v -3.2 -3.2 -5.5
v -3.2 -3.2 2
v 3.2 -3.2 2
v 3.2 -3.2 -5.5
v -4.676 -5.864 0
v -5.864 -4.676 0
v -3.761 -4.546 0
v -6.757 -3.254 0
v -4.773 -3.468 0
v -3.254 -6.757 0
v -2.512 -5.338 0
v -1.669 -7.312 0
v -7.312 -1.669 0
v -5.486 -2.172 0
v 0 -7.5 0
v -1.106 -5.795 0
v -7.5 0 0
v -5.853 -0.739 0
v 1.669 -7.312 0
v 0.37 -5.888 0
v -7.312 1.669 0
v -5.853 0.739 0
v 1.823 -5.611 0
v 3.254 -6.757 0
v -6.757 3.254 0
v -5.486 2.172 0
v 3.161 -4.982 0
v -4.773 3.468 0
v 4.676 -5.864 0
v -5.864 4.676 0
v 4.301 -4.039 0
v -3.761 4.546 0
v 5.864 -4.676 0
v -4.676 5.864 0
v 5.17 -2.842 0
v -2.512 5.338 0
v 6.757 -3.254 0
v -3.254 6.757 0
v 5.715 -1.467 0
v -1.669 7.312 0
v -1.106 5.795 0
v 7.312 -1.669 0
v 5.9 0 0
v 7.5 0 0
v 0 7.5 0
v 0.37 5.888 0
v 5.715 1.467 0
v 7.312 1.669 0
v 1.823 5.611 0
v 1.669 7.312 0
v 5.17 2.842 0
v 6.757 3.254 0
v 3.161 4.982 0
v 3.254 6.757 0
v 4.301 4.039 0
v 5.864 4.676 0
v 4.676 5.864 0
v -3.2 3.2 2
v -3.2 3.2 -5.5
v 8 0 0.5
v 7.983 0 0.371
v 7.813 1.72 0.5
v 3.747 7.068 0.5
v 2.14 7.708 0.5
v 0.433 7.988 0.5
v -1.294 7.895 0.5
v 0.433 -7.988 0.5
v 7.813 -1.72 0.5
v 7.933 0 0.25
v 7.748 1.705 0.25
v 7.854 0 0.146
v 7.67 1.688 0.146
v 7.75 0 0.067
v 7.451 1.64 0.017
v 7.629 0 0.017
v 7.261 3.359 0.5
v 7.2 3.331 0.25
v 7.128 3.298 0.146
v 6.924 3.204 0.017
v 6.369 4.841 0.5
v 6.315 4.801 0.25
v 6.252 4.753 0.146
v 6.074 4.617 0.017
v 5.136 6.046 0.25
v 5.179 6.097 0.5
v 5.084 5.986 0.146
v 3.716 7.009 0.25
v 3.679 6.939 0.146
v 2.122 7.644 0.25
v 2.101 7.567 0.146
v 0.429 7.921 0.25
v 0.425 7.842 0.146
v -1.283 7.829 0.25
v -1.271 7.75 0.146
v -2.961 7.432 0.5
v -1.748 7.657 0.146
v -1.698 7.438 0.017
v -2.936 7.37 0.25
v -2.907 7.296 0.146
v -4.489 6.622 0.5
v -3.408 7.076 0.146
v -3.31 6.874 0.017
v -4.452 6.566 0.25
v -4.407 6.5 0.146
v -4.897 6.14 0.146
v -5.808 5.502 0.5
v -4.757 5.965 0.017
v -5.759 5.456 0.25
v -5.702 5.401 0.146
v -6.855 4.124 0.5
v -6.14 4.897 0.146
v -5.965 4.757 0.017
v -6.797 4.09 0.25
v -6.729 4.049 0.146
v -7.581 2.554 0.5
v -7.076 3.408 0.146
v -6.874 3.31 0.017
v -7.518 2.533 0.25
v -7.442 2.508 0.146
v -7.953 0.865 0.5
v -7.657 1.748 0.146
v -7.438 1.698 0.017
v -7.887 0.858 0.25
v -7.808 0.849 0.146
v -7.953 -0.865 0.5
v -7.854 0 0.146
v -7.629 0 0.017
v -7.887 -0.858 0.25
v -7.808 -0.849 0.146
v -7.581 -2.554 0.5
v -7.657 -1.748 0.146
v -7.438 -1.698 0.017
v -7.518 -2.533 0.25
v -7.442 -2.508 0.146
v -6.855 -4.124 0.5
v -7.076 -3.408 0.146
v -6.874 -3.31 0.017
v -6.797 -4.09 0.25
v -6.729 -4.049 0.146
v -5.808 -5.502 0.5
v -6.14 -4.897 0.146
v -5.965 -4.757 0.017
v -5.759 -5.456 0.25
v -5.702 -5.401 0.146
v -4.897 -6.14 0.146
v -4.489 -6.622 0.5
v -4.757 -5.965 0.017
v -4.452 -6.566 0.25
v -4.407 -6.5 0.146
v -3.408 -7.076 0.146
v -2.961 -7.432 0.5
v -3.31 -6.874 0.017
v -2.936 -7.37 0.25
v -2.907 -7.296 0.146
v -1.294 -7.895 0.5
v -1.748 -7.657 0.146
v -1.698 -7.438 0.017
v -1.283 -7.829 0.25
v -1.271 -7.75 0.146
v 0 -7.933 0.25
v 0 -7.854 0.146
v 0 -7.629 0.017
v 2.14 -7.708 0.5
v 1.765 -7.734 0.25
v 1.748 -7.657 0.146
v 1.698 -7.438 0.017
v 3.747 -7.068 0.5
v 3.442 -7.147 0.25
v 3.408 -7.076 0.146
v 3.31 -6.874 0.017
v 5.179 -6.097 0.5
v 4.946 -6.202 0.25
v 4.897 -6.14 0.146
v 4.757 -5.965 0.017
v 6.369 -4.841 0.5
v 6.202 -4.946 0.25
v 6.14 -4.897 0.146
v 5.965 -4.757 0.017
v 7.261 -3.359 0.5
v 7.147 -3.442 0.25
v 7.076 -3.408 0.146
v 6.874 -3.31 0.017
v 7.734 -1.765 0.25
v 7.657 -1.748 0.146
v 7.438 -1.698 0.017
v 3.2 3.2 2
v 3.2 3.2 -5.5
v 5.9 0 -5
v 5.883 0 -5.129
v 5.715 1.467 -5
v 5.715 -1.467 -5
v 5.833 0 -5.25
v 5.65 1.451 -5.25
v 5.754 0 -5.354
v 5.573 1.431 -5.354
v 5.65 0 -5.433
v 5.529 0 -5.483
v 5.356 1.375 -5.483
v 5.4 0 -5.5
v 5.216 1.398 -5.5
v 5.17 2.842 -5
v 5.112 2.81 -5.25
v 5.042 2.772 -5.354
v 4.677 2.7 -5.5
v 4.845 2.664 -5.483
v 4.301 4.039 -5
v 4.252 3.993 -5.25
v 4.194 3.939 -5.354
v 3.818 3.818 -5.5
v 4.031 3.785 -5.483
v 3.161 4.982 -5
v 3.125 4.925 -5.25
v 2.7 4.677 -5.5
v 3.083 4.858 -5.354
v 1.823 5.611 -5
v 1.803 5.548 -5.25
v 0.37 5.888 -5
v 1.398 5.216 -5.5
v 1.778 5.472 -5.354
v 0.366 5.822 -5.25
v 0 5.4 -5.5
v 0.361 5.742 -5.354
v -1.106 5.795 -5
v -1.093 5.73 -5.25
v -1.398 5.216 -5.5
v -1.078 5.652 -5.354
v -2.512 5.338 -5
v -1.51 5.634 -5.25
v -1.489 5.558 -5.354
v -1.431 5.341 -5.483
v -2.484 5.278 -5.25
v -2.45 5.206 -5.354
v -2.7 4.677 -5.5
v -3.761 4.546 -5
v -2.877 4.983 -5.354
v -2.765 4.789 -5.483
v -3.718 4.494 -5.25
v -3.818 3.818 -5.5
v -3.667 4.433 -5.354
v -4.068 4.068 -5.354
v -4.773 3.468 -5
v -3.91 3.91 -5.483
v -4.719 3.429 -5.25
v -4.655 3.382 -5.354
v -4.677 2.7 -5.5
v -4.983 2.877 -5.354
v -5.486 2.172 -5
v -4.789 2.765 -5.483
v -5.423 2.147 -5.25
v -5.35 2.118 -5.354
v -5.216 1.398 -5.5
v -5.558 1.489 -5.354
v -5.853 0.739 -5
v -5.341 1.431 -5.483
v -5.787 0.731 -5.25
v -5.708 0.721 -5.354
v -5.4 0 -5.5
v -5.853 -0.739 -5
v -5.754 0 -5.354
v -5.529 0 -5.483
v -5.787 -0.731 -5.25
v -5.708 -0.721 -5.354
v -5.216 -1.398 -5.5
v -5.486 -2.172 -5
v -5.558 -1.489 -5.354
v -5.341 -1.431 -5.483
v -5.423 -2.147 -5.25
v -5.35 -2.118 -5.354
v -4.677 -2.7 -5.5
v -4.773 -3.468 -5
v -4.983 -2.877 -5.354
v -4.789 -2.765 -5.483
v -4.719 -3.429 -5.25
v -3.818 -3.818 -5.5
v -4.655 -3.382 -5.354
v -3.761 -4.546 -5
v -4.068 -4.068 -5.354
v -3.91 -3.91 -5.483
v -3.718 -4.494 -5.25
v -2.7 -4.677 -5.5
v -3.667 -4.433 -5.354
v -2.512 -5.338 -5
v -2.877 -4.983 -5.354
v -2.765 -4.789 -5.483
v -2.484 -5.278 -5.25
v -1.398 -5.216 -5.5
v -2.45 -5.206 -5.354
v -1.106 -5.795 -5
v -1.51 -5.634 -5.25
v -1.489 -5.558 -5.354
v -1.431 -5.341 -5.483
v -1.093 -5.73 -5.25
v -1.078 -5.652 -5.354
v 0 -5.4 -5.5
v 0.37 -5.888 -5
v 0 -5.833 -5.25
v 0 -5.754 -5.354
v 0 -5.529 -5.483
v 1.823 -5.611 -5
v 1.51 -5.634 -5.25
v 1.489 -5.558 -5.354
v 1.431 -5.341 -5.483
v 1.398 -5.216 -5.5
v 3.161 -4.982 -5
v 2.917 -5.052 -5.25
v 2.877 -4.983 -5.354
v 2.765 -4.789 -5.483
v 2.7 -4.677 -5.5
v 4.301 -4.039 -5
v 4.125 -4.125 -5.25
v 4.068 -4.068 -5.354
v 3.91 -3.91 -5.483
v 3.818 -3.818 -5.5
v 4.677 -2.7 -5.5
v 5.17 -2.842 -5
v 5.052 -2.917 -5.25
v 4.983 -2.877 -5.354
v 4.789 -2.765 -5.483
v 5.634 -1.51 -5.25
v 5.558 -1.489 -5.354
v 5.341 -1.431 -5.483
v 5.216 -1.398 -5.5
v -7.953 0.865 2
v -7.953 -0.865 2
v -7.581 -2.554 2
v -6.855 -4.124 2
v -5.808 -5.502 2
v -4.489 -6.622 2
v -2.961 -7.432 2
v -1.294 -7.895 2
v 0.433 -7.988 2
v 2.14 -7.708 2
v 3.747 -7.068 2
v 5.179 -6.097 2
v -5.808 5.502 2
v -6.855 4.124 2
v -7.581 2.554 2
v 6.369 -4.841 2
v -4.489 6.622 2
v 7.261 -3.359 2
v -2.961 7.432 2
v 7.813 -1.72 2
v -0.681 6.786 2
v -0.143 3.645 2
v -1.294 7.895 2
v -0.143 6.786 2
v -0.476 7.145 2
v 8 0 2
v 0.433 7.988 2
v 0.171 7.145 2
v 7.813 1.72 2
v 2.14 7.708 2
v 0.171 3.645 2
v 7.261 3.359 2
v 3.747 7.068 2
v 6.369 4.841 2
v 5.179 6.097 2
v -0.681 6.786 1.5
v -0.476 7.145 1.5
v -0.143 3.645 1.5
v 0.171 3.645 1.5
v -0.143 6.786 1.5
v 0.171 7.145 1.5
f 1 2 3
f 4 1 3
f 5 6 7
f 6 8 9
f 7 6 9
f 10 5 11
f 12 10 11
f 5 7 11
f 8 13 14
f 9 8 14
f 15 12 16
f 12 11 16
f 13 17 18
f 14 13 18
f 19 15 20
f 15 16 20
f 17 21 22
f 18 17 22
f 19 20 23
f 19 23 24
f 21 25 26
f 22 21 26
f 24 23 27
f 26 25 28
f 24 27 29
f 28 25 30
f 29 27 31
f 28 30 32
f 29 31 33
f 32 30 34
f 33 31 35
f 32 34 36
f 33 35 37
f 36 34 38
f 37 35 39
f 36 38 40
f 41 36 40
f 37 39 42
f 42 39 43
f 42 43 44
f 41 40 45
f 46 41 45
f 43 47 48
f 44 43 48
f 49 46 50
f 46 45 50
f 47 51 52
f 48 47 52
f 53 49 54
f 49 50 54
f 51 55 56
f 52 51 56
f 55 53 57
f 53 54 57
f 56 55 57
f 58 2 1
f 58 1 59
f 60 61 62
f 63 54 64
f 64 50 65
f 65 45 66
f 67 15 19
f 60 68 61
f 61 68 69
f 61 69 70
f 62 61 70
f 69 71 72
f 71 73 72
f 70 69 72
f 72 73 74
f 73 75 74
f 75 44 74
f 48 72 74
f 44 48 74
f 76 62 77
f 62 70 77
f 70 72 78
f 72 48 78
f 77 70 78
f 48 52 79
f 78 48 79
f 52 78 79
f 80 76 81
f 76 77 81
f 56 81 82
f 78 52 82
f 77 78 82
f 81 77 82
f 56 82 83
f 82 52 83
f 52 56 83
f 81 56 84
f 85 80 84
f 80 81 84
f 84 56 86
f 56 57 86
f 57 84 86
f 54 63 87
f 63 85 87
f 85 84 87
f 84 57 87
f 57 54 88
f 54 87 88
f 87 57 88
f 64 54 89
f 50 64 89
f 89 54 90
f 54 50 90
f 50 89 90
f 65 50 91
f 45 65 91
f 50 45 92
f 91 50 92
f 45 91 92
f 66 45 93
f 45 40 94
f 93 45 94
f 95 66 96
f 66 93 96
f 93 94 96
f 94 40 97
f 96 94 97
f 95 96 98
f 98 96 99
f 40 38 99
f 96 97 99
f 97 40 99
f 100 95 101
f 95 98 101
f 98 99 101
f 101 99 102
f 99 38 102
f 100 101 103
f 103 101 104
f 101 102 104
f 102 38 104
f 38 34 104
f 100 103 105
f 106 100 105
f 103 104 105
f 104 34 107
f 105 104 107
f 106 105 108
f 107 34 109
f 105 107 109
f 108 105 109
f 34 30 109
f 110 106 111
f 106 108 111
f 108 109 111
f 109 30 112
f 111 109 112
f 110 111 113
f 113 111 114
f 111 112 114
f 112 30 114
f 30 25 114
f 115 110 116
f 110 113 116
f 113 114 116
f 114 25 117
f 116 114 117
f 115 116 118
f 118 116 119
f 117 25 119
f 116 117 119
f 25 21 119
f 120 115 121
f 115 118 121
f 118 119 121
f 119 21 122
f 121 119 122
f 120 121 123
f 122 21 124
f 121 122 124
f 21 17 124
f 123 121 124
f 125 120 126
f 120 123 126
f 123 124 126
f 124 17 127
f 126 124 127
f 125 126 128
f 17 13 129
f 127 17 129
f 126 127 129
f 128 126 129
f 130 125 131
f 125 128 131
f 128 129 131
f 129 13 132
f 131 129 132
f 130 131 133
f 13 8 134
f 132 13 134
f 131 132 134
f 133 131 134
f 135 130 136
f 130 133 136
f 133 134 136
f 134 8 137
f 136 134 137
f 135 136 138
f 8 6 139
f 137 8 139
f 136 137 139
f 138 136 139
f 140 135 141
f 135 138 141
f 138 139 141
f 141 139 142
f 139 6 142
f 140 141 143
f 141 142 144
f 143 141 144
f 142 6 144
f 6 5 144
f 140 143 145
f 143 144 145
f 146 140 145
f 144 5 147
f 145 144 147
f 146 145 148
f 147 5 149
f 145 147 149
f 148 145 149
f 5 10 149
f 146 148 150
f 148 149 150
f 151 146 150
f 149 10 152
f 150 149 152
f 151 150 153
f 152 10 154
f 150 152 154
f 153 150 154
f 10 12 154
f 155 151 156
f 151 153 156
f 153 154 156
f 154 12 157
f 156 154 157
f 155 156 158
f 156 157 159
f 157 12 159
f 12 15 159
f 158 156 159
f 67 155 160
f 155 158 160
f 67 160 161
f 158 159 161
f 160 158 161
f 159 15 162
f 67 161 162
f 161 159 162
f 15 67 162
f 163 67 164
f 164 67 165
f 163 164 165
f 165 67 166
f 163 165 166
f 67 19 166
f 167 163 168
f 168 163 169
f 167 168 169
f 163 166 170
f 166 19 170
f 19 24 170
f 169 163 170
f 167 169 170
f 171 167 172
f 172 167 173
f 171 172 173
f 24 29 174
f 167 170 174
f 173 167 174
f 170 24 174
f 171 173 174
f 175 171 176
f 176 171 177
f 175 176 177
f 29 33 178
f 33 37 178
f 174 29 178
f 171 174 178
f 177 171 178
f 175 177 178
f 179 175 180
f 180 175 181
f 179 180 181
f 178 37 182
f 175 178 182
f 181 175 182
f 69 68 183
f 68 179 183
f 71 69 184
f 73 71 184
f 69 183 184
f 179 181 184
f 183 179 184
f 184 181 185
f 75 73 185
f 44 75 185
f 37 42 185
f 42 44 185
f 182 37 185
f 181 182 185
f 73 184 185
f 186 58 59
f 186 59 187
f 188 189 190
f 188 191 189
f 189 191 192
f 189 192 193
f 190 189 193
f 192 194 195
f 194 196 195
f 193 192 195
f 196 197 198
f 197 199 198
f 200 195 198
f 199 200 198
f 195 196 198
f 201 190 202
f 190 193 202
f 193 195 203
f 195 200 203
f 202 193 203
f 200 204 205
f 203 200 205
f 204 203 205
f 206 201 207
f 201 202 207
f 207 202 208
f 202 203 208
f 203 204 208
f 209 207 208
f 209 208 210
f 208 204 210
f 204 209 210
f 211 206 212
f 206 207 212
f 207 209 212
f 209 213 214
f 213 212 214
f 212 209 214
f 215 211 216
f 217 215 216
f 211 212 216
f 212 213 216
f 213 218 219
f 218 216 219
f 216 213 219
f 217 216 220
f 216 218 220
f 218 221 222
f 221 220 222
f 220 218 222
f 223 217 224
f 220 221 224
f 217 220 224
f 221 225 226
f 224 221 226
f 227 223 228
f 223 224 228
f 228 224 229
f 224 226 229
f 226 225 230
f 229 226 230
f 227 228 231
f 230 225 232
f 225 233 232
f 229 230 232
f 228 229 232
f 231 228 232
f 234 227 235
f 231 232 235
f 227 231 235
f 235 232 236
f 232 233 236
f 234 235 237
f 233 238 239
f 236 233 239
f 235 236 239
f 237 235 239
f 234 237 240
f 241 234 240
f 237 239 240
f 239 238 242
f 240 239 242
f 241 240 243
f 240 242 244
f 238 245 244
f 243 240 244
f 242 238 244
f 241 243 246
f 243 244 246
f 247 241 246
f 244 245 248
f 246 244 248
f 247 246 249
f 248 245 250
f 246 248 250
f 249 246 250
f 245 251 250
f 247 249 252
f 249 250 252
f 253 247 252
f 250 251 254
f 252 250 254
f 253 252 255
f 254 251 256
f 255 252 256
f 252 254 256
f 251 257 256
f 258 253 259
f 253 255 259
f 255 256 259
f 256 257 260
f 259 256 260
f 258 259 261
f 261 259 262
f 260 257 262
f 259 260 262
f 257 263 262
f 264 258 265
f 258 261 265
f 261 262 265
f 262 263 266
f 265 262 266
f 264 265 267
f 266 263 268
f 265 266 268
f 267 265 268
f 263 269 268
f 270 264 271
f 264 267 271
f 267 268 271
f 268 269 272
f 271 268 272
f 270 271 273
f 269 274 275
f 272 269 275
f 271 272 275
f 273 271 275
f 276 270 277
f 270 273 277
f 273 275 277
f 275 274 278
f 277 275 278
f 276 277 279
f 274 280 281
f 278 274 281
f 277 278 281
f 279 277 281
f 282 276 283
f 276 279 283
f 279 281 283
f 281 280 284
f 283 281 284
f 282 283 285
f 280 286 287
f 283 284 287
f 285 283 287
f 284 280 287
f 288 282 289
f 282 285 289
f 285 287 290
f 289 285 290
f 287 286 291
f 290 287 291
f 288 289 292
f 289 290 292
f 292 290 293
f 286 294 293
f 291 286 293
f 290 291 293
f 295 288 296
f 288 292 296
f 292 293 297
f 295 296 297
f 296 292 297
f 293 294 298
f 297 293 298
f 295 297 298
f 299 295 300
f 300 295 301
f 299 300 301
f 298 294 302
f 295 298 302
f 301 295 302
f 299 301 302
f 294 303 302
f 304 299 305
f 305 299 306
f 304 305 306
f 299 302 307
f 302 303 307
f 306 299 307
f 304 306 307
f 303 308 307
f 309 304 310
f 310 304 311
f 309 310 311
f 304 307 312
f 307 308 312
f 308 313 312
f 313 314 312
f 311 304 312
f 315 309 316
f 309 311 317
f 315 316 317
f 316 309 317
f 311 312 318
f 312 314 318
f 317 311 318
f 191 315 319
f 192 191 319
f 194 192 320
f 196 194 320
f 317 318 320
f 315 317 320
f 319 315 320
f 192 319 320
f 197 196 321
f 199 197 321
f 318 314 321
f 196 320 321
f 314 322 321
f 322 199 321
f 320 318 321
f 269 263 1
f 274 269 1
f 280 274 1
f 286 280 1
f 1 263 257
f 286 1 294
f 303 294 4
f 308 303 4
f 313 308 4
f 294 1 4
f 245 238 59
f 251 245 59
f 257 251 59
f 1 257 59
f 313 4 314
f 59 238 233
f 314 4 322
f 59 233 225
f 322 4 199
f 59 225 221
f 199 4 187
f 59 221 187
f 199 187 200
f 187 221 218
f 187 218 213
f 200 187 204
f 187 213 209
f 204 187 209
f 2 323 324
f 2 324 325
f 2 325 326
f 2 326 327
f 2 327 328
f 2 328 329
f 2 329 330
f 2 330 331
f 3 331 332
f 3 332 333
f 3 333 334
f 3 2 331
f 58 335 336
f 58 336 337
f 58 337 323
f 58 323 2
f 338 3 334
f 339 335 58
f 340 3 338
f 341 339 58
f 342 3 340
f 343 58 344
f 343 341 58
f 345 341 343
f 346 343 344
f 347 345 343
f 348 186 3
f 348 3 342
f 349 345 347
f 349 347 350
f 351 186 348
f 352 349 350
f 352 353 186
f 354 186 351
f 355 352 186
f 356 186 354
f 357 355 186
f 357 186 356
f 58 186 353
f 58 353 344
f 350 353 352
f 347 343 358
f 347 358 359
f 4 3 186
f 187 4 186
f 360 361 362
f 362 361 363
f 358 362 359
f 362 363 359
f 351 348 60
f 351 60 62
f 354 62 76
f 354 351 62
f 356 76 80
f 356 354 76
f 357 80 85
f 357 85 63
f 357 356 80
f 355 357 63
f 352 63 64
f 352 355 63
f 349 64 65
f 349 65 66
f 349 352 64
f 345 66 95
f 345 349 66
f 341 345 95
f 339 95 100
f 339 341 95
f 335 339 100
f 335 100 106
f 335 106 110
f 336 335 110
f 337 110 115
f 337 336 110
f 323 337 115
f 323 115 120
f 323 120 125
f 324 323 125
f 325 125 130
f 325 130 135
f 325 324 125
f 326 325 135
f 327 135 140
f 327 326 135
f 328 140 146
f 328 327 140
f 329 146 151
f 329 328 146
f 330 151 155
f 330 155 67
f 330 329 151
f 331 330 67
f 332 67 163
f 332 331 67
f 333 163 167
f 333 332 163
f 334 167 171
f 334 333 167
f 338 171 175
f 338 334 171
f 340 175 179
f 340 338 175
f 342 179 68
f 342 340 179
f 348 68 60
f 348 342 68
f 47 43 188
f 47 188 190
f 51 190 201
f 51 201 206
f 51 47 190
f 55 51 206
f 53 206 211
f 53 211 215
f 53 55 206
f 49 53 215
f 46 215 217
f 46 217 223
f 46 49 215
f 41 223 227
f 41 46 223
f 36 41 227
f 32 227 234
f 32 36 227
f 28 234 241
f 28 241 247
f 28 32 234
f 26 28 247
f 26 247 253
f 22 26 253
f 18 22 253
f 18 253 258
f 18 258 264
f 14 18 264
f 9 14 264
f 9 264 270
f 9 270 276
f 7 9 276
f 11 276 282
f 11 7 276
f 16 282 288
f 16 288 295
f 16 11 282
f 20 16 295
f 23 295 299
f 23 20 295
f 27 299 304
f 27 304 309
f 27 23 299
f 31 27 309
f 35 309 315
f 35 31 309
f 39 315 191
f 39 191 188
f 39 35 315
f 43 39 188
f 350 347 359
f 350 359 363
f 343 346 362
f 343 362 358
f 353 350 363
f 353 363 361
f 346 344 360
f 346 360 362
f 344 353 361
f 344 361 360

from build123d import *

# Parameters (mm, degrees)
SKETCH1_R           = 5.9
SKETCH1_W           = 6.4
SKETCH1_H           = 6.4
BOSS_EXTRUDE1_DEPTH = 5.5
SKETCH1_3_R         = 8
SKETCH1_3_W         = 6.4
SKETCH1_3_H         = 6.4
BOSS_EXTRUDE2_DEPTH = 2
FILLET1_R           = 0.5
CUT_EXTRUDE1_DEPTH  = 0.5


with BuildPart() as part:
    # Sketch1 → Boss-Extrude1 (new body)
    with BuildSketch(Plane.XY):
        Circle(SKETCH1_R)
        Rectangle(SKETCH1_W, SKETCH1_H, mode=Mode.SUBTRACT)
    extrude(amount=-BOSS_EXTRUDE1_DEPTH)

    # Sketch1<3> → Boss-Extrude2 (add)
    with BuildSketch(Plane.XY):
        Circle(SKETCH1_3_R)
        Rectangle(SKETCH1_3_W, SKETCH1_3_H, mode=Mode.SUBTRACT)
    extrude(amount=BOSS_EXTRUDE2_DEPTH)

    # Fillet1
    fillet1_edges = [part.edges().sort_by_distance(p)[0] for p in [
        (-8, 0, 0),
        (-5.9, 0, -5.5),
    ]]
    fillet(fillet1_edges, radius=FILLET1_R)

    # Sketch2 → Cut-Extrude1 (cut)
    with BuildSketch(Plane.XY.offset(2)):
        Polygon((-0.475804426, 7.144860485), (0.171330991, 7.144860485), (0.171330991, 3.644860485), (-0.142771573, 3.644860485), (-0.142771573, 6.785886126), (-0.681233112, 6.785886126), align=None)
    extrude(amount=-CUT_EXTRUDE1_DEPTH, mode=Mode.SUBTRACT)


solid = part.part
